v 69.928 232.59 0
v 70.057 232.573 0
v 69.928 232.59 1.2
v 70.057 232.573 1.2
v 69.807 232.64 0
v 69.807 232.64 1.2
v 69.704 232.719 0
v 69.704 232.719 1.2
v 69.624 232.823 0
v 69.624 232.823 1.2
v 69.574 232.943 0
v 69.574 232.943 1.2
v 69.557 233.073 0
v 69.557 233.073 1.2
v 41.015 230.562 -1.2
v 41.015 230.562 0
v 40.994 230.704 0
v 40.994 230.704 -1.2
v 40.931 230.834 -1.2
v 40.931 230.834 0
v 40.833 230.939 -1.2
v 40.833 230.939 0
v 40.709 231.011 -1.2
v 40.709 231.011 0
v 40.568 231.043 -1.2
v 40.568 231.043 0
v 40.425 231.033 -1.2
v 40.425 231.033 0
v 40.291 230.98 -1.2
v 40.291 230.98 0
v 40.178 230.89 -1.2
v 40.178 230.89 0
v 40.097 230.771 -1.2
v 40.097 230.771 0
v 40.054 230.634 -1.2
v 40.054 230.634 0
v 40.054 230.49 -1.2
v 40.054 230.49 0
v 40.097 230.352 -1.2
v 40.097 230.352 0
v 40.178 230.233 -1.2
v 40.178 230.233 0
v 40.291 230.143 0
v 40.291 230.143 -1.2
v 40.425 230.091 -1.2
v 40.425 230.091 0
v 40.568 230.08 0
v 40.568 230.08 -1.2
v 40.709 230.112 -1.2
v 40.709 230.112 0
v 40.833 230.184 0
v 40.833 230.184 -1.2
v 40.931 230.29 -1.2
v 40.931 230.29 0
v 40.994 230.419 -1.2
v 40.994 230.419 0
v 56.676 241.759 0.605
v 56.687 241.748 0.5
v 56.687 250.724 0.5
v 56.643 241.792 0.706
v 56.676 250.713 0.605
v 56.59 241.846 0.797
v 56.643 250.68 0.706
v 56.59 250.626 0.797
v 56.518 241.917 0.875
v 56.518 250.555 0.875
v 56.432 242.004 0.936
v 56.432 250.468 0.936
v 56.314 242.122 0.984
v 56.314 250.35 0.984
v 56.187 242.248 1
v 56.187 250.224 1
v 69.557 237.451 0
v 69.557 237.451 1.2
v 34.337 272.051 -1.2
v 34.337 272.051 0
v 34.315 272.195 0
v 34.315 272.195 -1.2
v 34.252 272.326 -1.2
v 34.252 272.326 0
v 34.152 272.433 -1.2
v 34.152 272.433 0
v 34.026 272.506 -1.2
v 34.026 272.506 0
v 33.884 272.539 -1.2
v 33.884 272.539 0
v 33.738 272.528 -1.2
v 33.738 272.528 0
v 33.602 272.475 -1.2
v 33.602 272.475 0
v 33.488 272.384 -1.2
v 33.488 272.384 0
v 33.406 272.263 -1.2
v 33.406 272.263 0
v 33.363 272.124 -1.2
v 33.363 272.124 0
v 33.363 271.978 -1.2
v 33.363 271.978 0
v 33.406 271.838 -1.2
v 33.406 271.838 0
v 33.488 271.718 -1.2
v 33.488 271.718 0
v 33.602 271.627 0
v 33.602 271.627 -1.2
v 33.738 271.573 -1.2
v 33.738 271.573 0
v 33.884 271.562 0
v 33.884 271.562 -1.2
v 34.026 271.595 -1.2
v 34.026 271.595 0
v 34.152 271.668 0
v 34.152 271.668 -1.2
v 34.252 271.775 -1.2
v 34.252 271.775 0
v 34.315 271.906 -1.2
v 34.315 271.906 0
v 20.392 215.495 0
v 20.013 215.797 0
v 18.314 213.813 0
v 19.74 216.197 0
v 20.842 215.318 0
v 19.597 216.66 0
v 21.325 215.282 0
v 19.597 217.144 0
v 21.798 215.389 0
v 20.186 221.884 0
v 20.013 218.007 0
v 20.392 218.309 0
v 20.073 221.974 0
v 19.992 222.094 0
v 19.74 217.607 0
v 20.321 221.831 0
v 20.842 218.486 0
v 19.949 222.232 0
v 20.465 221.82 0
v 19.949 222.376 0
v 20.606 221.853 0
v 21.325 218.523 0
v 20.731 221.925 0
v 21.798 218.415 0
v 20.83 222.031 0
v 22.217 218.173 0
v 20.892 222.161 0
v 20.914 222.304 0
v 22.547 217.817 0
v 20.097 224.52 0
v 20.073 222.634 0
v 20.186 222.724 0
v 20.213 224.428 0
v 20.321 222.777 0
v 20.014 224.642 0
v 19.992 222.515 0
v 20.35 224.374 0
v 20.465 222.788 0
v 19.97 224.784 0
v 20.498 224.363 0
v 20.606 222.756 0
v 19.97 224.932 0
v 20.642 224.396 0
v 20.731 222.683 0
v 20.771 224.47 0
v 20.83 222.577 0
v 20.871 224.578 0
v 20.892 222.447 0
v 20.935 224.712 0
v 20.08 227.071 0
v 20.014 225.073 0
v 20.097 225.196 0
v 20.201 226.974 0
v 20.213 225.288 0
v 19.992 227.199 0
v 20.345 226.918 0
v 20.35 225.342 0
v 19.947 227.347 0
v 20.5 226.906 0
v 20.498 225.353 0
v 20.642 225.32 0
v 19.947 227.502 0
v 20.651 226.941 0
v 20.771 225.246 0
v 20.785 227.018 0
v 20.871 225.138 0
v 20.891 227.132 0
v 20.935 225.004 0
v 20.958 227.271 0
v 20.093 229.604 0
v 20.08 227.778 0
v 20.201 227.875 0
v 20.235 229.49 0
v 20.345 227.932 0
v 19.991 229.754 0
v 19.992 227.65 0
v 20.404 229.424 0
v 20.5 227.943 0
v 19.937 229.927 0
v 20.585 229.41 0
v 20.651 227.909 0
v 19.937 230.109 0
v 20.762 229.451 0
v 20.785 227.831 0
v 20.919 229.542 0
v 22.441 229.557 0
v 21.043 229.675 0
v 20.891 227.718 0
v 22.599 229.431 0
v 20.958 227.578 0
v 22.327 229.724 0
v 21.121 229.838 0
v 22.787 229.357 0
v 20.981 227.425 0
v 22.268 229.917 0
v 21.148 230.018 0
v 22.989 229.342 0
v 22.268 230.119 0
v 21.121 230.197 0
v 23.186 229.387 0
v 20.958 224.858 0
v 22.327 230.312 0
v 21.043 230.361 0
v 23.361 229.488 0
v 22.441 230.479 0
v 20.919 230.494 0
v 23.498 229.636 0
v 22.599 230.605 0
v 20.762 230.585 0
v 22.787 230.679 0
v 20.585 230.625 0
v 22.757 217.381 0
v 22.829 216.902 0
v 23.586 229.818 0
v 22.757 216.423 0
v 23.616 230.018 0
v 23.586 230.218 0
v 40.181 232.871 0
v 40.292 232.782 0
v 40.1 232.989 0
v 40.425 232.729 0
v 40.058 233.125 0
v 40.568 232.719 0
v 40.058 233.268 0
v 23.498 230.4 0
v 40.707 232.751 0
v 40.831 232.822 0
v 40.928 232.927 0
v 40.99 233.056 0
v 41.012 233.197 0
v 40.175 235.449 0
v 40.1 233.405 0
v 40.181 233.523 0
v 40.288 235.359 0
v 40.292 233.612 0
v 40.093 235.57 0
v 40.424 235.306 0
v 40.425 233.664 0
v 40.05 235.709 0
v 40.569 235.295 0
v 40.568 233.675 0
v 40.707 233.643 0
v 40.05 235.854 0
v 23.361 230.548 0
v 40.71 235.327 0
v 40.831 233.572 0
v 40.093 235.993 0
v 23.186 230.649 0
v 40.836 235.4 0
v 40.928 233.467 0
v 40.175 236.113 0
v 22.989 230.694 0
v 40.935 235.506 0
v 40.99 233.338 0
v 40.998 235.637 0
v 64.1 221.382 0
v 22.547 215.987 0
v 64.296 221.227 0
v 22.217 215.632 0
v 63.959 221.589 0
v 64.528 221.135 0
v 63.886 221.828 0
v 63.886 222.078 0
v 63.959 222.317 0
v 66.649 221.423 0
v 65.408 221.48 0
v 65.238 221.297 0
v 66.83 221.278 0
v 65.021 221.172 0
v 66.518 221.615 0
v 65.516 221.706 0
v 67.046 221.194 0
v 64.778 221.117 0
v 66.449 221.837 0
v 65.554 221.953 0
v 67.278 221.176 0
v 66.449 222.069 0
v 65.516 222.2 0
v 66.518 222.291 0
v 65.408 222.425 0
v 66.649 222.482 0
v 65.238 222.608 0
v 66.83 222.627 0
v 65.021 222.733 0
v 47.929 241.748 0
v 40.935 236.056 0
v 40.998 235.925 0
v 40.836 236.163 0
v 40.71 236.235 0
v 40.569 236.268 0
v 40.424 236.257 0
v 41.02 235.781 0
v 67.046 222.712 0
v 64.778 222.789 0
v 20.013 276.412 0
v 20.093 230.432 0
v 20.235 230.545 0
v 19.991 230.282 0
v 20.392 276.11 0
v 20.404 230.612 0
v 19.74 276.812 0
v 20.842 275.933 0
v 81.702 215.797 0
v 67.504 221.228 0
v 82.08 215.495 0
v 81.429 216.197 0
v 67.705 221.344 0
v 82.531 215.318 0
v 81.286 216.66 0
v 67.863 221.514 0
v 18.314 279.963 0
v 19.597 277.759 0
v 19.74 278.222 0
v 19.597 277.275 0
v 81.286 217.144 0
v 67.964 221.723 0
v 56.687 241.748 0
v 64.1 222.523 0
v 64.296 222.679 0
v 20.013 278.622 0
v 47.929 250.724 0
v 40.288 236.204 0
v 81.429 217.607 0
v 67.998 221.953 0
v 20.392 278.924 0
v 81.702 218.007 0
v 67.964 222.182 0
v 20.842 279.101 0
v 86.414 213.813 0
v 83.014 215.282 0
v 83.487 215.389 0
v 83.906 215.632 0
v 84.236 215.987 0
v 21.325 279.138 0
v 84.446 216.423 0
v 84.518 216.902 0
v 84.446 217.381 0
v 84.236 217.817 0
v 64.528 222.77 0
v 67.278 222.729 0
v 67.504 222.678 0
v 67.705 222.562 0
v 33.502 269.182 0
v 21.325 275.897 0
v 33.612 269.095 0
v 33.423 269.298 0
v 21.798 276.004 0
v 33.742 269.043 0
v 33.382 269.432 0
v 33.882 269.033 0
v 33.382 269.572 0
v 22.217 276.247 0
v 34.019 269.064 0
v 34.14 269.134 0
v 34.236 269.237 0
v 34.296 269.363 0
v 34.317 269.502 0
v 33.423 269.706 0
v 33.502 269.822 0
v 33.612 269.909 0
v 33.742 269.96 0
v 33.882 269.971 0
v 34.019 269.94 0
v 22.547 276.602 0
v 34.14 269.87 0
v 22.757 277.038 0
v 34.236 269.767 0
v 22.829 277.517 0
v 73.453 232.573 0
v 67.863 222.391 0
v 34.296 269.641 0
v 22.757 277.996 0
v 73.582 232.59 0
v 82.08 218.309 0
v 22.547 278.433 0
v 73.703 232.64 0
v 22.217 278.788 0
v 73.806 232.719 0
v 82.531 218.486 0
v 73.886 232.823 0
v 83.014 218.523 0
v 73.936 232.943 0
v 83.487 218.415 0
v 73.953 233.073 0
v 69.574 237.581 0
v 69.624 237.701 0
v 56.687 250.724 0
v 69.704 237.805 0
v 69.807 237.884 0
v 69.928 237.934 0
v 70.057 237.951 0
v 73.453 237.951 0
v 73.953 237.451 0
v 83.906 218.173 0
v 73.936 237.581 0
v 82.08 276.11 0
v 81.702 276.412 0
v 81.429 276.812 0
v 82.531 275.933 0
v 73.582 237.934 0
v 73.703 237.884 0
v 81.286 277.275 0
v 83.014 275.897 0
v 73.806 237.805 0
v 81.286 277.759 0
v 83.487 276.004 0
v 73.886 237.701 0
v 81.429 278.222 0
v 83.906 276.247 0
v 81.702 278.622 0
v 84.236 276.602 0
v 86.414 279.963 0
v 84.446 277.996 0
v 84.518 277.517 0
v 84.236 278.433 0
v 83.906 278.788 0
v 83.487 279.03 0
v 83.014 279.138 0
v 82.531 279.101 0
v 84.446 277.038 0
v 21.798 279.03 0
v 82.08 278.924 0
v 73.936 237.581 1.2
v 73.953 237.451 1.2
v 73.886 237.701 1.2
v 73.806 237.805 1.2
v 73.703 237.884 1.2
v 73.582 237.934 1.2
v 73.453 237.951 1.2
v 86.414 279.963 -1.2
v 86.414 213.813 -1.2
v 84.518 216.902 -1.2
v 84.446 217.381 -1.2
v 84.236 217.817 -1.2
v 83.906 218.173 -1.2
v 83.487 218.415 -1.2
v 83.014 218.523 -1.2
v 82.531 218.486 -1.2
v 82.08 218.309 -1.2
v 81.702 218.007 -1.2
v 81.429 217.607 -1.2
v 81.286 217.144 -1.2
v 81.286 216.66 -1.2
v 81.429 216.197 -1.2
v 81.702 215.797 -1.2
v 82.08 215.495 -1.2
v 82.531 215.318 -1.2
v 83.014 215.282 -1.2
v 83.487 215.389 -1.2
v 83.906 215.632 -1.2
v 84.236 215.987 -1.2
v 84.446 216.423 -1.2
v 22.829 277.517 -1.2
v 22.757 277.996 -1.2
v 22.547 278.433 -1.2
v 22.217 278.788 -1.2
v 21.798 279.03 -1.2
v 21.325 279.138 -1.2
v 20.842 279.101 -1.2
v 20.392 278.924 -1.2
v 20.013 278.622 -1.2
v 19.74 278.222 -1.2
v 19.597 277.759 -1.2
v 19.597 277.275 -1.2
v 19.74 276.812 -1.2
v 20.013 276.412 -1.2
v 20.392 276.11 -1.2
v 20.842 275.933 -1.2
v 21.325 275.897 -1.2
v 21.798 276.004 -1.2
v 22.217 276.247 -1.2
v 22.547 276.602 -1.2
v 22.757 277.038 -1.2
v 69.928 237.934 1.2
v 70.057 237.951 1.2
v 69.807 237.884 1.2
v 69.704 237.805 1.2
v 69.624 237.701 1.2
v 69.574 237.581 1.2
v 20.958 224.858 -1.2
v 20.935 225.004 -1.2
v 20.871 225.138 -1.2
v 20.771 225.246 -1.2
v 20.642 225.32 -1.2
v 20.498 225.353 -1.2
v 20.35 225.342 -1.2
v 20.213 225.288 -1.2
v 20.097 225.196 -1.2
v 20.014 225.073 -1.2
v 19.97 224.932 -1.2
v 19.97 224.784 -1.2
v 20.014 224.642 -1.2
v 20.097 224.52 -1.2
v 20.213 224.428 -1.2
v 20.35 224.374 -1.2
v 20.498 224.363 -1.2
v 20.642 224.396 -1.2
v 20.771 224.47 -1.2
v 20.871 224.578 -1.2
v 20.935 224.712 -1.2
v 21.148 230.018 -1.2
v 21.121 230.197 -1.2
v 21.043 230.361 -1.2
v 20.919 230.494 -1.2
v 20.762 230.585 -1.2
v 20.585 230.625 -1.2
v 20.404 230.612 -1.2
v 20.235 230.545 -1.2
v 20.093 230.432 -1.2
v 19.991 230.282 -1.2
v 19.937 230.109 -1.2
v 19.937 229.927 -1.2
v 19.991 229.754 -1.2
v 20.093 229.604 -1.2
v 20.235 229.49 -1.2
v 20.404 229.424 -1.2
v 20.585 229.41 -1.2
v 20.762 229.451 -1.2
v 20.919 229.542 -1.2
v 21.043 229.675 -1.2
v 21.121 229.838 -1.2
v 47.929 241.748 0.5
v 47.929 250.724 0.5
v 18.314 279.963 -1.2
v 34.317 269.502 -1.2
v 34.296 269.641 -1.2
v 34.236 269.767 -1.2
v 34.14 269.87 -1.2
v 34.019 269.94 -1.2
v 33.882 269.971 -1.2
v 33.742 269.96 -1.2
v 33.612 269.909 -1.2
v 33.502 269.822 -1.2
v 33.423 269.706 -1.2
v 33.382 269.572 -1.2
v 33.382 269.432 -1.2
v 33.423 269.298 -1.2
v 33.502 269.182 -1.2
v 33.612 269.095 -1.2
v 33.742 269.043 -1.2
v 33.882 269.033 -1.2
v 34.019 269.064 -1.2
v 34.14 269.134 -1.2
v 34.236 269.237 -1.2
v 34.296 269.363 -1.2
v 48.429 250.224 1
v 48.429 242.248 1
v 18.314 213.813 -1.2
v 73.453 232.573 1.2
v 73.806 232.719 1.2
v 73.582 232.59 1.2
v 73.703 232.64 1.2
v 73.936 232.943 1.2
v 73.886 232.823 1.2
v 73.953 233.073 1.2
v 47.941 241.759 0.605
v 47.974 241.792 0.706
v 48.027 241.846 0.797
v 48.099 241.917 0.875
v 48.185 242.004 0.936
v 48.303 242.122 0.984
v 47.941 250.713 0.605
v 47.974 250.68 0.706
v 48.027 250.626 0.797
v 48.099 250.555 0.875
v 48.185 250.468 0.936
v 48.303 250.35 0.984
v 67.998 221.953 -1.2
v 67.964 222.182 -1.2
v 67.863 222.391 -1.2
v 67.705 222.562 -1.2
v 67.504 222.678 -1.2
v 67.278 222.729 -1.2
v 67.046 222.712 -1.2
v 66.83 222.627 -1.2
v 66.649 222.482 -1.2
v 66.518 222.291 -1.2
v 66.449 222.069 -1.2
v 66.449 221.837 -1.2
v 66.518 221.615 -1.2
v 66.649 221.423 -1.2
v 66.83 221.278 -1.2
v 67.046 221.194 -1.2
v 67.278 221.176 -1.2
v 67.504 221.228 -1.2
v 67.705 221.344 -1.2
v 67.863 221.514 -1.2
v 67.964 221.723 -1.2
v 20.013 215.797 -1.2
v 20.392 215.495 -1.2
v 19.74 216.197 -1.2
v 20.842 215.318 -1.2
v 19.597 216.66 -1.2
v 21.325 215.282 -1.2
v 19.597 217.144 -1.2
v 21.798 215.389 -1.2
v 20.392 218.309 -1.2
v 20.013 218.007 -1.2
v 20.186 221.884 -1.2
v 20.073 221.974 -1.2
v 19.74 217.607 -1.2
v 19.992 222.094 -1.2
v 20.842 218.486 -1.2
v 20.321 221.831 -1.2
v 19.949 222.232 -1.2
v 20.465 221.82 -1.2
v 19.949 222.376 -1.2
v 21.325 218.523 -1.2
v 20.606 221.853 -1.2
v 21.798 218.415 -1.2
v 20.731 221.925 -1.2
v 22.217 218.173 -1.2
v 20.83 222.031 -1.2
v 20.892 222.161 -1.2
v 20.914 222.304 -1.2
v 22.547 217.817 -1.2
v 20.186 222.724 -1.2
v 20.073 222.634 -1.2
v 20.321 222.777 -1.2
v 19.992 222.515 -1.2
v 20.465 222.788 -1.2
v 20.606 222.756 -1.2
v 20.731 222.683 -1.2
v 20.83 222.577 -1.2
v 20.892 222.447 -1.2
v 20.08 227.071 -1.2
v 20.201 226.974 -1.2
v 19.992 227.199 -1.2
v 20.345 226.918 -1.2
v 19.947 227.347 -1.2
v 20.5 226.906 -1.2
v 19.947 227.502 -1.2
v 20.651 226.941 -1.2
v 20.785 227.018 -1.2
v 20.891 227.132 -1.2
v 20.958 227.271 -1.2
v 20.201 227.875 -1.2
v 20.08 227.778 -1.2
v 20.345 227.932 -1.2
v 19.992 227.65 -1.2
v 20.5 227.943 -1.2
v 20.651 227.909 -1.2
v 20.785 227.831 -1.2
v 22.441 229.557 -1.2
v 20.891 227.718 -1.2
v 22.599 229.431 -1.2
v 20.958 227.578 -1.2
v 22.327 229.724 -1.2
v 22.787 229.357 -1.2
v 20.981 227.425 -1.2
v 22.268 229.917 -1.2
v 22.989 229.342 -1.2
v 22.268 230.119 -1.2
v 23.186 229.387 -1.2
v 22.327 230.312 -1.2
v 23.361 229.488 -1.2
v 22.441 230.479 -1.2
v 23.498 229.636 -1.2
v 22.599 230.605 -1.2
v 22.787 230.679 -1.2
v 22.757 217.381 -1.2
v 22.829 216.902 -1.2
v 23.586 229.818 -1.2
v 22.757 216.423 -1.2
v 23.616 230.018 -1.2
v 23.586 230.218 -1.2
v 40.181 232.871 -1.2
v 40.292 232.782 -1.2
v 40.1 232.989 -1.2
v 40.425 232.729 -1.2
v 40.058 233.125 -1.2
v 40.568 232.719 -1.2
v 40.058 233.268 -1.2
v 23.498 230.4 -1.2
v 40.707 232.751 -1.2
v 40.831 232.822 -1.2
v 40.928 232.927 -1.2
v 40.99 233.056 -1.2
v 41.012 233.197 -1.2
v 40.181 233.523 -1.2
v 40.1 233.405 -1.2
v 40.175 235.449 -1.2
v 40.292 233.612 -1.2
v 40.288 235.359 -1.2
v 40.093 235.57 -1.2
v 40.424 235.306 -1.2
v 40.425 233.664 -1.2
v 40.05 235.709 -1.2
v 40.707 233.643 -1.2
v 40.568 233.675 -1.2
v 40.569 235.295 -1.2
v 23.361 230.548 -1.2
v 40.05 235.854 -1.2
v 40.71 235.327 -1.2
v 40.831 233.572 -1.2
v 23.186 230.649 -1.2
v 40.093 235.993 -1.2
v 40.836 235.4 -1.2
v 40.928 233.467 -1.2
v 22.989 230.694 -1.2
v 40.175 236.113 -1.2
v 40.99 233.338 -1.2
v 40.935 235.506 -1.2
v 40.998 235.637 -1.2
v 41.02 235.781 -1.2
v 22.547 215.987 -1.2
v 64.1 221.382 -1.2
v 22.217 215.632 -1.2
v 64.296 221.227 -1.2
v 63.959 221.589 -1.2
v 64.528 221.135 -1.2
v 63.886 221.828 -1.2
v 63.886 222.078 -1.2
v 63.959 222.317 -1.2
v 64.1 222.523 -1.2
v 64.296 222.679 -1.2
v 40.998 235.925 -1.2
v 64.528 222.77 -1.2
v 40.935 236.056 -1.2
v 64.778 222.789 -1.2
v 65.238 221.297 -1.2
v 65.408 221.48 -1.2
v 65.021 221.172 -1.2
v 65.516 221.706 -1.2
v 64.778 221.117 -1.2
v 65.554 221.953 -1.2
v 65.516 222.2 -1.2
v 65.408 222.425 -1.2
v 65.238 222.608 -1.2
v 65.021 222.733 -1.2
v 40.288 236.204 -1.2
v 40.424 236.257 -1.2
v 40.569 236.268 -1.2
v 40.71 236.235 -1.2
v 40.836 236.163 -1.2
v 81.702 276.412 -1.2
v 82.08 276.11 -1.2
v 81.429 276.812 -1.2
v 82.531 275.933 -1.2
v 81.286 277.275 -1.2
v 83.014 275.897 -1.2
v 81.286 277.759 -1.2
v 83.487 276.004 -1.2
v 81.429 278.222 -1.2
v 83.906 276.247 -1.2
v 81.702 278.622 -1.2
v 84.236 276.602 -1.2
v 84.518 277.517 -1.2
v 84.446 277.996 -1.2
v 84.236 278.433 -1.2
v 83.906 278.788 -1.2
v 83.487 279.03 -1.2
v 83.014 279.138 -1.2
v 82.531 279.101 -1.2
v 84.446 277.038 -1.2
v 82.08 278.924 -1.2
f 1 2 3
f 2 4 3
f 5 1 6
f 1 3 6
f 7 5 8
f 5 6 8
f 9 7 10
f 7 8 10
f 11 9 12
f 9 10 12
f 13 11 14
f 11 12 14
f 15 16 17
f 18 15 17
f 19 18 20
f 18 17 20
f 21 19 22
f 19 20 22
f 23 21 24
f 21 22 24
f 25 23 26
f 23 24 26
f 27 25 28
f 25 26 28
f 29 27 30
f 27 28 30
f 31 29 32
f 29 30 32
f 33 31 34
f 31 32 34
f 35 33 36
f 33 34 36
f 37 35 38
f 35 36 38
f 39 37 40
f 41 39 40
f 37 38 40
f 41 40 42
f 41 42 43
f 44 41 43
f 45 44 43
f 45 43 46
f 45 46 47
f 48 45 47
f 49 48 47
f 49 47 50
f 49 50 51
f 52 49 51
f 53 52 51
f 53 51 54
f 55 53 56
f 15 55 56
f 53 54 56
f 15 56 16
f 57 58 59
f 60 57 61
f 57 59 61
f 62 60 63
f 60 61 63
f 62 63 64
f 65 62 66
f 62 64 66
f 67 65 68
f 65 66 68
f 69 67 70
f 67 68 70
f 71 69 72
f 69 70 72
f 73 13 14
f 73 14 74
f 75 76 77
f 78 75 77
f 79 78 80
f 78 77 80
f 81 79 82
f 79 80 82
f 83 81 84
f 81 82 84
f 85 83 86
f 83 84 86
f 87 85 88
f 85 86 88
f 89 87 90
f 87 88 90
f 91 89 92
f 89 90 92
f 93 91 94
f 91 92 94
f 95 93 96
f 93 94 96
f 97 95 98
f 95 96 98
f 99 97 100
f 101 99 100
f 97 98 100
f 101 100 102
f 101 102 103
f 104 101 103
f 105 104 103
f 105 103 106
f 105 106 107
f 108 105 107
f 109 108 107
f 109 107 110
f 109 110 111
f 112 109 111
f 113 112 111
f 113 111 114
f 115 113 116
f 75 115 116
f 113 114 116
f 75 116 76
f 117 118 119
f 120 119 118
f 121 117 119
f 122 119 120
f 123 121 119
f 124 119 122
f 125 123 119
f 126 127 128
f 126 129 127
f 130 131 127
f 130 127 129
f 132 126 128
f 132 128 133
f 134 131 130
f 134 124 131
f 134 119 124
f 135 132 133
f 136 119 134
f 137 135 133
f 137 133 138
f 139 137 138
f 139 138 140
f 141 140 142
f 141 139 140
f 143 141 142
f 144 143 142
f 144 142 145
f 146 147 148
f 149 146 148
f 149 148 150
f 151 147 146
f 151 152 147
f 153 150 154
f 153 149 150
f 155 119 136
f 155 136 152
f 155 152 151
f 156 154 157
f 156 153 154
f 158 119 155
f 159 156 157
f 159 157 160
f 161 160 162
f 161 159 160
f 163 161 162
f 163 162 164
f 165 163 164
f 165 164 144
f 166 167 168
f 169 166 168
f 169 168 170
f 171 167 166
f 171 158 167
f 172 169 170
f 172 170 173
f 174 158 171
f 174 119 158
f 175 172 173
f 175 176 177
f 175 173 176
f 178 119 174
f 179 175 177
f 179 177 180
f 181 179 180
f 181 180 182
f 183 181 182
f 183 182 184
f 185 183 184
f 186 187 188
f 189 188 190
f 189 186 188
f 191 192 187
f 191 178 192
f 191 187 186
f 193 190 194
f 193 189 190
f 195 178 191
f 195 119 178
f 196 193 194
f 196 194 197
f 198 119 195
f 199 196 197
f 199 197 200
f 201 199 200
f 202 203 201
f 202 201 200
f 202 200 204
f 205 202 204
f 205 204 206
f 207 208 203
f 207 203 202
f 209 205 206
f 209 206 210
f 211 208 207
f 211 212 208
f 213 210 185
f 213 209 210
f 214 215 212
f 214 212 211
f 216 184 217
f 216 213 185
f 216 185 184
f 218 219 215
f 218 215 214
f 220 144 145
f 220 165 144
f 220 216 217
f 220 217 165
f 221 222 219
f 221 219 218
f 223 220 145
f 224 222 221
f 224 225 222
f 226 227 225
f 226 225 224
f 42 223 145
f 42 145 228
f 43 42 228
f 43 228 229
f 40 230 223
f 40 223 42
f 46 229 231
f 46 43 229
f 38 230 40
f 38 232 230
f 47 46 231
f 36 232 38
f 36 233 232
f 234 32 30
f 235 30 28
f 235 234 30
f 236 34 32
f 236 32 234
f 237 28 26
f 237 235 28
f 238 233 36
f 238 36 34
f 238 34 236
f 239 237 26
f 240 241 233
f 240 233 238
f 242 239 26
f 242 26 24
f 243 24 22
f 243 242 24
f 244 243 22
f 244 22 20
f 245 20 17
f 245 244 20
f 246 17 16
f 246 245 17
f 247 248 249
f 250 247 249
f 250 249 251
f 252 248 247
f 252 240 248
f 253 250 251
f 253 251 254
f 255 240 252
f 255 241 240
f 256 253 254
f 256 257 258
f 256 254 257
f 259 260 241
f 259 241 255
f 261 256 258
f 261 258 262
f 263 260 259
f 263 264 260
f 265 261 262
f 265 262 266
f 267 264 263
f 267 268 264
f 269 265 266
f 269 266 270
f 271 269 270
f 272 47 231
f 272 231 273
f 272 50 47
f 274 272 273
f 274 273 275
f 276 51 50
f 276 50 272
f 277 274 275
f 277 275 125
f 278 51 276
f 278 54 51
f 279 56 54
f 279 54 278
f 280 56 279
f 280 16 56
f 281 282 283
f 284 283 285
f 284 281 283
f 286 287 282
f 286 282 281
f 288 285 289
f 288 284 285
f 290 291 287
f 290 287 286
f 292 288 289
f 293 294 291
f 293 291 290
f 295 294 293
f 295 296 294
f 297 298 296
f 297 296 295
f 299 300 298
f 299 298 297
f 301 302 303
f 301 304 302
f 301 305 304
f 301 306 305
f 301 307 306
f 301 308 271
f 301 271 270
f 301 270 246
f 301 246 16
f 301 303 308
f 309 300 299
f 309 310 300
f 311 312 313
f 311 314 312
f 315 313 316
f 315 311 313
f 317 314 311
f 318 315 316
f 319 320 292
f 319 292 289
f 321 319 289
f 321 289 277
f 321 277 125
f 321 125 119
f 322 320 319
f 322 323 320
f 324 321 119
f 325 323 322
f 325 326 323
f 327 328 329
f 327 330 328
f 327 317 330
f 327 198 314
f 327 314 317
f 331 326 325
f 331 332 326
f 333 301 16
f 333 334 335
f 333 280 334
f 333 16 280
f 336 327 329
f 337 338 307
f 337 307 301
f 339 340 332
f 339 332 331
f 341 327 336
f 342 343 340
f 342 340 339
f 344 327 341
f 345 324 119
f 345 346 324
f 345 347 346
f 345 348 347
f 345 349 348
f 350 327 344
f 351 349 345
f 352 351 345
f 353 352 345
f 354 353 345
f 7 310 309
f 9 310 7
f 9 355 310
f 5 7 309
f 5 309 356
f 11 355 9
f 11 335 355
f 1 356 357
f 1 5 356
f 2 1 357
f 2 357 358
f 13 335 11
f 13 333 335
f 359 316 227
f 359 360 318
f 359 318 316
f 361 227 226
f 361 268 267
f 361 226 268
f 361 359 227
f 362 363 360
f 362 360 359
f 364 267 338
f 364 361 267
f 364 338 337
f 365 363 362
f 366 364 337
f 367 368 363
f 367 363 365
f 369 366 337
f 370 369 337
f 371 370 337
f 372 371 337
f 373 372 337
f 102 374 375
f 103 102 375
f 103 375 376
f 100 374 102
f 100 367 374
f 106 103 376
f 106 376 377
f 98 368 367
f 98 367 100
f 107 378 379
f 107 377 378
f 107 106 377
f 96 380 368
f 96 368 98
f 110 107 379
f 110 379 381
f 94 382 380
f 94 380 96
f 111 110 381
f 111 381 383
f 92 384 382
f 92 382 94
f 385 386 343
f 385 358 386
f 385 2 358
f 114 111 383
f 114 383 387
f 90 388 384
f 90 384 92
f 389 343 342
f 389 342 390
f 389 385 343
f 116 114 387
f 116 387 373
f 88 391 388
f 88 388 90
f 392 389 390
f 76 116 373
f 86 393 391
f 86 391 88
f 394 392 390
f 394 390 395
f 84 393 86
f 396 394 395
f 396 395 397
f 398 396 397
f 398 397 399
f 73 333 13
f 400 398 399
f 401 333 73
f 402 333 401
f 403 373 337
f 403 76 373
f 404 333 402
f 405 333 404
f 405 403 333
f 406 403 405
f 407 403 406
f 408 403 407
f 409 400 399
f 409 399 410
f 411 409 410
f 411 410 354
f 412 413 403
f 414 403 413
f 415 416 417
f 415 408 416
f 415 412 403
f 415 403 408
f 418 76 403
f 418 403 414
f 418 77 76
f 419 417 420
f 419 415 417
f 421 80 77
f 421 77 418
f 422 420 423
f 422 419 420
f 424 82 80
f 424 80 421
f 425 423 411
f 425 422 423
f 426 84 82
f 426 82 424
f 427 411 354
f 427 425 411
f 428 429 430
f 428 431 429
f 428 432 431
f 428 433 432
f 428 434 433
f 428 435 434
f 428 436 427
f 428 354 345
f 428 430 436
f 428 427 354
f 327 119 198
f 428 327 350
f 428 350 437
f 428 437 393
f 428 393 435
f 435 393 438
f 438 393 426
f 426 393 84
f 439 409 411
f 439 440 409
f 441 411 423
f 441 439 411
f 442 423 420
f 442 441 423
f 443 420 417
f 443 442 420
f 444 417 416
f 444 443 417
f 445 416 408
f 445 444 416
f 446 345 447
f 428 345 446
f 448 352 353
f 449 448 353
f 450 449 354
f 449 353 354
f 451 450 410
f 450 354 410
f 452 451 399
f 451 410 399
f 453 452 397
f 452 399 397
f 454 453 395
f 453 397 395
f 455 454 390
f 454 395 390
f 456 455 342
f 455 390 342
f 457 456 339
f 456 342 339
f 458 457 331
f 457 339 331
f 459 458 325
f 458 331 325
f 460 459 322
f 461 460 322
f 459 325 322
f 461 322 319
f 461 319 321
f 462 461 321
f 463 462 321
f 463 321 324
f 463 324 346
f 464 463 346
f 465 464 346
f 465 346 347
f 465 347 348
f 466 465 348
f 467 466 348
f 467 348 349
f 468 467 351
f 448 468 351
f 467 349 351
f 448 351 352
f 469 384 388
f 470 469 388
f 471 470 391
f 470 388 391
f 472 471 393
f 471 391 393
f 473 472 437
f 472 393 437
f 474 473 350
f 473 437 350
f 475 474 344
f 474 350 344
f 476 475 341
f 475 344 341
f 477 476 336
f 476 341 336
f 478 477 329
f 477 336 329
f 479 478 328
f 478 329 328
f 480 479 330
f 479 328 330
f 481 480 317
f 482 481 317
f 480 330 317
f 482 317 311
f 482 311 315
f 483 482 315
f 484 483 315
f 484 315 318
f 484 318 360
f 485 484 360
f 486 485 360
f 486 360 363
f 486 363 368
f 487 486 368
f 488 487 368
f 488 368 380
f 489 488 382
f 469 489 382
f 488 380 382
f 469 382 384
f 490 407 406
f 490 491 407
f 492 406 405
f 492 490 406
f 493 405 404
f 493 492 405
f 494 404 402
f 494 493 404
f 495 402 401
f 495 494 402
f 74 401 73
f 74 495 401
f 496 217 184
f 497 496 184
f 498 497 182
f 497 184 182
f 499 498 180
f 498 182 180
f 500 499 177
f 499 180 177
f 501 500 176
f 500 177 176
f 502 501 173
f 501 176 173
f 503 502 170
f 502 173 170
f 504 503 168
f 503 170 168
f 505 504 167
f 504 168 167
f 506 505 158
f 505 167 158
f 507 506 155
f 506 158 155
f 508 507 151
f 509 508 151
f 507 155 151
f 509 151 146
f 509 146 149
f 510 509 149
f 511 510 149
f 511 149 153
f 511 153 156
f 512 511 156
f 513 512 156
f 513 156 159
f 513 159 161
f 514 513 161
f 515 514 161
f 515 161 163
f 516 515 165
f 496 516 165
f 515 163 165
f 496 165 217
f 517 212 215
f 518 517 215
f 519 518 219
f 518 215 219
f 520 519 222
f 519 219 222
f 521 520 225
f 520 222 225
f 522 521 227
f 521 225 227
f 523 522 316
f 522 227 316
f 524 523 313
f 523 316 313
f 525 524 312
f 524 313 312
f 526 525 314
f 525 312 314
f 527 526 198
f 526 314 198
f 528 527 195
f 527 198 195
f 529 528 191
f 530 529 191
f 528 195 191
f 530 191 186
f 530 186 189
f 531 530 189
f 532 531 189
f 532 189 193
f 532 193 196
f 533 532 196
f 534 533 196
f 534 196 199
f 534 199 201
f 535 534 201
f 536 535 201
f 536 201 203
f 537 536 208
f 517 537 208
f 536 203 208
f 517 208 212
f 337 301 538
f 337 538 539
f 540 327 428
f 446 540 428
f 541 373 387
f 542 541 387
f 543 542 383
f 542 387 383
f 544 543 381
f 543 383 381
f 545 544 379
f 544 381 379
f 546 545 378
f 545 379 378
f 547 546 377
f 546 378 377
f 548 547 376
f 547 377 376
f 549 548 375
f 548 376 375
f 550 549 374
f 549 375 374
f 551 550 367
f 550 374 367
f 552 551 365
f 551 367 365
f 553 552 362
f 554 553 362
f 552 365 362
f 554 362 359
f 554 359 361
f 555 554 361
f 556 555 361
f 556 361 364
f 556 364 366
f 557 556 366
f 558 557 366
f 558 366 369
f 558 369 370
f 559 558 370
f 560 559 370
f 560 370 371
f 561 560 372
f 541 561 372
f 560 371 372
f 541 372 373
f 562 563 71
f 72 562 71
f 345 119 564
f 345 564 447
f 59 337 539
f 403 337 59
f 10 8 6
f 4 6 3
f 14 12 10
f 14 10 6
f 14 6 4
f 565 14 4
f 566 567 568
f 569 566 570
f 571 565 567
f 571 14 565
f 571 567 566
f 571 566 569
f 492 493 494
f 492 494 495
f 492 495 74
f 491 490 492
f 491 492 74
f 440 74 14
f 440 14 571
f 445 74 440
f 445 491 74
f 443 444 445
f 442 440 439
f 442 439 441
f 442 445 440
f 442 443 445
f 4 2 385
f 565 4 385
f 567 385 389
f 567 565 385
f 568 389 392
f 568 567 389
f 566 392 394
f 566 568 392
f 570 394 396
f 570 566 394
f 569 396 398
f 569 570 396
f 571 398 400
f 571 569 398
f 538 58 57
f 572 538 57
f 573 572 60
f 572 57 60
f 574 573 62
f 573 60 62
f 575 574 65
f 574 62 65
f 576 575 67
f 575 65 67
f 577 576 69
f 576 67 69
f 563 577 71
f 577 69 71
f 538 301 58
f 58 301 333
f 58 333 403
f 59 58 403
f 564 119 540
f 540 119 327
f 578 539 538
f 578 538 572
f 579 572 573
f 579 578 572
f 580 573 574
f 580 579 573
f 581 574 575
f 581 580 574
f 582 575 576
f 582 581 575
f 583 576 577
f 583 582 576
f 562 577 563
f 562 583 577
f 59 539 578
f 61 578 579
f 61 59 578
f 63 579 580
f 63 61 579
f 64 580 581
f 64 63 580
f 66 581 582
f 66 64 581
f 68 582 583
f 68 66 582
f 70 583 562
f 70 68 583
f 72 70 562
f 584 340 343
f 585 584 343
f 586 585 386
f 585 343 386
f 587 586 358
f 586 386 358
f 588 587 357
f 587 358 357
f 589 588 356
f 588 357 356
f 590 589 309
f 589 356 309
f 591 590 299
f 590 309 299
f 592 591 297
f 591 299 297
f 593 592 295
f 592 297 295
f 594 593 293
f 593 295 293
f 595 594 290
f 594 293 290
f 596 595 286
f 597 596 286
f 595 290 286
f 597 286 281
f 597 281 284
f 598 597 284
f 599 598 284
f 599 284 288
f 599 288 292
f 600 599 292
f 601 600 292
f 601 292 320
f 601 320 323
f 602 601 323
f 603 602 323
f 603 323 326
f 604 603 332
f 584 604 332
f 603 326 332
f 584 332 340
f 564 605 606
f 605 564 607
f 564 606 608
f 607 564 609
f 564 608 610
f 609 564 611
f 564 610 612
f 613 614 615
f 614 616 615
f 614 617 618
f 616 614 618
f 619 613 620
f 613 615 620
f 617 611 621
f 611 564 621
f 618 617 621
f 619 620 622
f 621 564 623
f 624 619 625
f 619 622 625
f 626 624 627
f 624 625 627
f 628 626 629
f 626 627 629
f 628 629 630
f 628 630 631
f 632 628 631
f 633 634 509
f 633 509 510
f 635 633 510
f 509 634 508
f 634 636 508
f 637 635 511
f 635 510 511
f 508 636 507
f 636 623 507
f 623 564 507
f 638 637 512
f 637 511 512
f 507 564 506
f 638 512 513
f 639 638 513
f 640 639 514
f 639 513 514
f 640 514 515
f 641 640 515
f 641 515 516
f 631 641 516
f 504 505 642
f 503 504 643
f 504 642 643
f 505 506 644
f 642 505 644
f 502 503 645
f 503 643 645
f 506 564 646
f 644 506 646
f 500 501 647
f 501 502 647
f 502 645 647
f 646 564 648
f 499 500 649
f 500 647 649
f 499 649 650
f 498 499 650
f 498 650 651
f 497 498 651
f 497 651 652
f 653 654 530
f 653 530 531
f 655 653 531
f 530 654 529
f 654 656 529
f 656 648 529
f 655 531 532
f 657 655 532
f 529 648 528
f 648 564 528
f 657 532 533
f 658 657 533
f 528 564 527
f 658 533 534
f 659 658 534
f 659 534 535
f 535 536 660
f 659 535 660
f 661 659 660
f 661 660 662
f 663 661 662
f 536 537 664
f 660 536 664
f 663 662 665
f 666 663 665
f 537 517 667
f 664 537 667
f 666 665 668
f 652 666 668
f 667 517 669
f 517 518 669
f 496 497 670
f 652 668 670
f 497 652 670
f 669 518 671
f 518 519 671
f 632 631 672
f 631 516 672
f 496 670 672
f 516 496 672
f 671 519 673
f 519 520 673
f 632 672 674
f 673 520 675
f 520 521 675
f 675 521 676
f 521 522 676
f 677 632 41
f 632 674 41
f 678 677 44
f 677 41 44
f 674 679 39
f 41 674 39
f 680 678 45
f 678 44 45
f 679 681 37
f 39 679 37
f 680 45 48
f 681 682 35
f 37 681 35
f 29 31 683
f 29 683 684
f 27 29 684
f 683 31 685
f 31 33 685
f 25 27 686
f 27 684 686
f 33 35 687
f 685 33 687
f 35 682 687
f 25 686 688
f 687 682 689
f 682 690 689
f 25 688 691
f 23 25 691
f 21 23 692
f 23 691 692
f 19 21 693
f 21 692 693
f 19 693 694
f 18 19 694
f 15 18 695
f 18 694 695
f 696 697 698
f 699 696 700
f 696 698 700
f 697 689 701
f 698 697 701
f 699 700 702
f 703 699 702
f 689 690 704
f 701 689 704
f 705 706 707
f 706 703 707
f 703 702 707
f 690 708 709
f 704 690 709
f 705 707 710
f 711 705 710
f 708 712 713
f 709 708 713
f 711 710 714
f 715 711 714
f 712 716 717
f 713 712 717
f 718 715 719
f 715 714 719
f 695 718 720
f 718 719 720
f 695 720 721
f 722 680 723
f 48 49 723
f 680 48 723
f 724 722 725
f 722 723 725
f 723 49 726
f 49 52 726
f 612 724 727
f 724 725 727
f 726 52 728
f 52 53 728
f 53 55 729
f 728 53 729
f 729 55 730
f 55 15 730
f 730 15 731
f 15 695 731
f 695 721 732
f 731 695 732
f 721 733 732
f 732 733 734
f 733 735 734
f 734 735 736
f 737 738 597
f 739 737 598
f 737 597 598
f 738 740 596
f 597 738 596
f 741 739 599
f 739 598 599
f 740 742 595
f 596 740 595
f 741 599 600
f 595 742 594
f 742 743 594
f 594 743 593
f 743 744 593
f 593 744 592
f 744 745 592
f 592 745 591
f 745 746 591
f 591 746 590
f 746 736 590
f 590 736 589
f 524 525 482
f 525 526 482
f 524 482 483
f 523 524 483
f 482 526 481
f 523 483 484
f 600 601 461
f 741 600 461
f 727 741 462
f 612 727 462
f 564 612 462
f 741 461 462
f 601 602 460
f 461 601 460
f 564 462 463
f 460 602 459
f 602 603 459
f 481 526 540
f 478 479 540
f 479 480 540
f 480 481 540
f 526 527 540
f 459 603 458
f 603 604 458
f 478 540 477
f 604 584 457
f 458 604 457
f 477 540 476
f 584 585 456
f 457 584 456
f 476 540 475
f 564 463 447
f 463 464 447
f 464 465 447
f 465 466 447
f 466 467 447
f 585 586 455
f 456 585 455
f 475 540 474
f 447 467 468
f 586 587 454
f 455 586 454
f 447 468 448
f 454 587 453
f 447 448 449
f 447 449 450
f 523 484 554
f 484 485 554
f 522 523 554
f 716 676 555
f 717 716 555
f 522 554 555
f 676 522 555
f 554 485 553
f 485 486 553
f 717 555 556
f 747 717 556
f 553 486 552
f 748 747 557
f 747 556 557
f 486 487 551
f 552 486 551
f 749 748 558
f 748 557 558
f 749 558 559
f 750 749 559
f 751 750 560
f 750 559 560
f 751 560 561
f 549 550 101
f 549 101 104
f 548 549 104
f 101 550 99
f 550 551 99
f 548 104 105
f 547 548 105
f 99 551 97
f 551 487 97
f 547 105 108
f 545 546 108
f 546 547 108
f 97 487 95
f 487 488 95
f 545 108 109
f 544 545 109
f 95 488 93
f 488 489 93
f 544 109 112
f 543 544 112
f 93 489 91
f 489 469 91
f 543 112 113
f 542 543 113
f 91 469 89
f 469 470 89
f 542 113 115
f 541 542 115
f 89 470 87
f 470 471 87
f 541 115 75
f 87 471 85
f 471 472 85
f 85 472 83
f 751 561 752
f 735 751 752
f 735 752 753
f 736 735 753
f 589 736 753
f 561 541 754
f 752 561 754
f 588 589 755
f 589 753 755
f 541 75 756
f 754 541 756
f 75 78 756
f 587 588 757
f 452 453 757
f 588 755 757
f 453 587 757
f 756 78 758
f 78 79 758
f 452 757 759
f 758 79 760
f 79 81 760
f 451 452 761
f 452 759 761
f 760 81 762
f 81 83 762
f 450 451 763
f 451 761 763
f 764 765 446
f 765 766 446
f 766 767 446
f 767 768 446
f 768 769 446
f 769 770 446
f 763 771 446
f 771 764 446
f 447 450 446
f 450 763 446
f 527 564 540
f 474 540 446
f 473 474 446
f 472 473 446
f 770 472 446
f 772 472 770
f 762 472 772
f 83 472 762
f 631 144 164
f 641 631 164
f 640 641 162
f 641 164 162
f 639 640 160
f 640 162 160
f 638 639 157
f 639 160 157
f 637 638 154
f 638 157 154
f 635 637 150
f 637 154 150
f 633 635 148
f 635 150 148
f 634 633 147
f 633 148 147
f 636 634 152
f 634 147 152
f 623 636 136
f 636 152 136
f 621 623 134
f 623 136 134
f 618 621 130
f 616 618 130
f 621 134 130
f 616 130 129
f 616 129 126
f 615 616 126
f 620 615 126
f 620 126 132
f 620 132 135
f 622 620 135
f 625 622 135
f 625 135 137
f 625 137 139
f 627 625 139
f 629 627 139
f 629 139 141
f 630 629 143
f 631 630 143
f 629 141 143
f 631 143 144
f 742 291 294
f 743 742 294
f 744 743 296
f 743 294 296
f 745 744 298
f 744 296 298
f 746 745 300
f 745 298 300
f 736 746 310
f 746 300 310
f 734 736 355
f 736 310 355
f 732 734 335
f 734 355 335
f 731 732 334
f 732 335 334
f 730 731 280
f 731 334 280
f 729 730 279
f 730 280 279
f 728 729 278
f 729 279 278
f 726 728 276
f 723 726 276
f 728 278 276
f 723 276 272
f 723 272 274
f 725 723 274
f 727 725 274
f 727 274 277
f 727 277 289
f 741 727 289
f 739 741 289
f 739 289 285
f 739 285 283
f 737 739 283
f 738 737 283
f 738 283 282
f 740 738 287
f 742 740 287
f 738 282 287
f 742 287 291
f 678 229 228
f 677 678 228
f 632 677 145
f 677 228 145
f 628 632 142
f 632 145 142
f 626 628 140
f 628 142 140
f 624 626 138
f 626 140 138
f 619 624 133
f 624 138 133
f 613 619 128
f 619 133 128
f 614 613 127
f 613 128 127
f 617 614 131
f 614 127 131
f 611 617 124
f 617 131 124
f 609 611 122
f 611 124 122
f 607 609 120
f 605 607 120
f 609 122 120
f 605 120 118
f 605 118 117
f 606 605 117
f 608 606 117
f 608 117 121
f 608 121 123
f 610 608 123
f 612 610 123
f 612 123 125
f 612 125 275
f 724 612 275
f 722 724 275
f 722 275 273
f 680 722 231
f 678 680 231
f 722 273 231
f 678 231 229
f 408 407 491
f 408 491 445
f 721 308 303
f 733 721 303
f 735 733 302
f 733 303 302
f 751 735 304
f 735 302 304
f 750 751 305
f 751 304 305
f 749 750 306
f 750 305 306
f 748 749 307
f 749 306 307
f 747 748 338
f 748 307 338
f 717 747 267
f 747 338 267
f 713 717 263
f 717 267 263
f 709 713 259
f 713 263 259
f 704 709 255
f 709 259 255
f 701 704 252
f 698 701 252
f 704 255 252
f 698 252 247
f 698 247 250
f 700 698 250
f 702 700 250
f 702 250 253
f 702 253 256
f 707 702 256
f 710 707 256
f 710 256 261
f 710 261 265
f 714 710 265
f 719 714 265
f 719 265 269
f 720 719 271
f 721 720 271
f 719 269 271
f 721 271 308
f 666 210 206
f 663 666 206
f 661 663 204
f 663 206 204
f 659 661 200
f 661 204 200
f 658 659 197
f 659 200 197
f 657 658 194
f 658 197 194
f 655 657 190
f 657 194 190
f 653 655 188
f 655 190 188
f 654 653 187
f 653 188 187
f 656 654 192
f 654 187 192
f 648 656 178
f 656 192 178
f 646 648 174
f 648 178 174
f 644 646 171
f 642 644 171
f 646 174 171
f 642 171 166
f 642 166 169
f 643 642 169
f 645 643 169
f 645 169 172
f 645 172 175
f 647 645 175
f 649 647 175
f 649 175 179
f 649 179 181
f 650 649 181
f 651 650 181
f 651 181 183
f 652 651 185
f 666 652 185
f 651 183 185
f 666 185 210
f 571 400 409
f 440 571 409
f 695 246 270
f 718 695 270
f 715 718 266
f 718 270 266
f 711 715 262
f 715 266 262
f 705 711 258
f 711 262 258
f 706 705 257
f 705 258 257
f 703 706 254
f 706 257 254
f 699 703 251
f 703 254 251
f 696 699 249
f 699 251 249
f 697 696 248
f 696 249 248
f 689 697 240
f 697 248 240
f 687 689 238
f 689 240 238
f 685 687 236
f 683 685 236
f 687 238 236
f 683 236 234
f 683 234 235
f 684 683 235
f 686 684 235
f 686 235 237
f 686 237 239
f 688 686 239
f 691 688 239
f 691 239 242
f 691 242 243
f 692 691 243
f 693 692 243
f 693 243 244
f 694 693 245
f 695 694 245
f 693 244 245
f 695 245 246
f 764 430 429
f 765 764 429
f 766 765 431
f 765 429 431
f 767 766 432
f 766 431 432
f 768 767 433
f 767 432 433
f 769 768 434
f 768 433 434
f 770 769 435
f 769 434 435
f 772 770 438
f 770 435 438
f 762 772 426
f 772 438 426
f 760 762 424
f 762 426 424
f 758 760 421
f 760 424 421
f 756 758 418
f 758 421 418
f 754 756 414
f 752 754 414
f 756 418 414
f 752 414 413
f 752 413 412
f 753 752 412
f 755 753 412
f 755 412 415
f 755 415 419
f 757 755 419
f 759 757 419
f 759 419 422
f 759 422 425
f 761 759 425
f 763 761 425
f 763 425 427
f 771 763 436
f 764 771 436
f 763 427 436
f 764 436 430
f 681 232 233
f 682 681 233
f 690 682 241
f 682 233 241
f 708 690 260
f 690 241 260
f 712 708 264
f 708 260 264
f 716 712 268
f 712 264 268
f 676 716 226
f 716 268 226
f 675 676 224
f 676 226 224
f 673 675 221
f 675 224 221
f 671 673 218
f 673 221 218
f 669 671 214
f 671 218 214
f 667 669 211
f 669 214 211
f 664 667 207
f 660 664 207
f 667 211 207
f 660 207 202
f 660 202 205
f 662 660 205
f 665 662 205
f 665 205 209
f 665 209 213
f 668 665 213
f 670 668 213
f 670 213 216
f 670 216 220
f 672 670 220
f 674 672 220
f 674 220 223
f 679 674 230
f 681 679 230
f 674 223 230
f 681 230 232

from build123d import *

# Parameters (mm, degrees)
ESQUISSE1_W        = 68.1
ESQUISSE1_H        = 66.15
ESQUISSE1_R        = 1.625
ESQUISSE1_R_2      = 0.5199497
ESQUISSE1_R_3      = 0.496597476
ESQUISSE1_R_4      = 0.485049202
ESQUISSE1_R_5      = 0.608998307
ESQUISSE1_R_6      = 0.677903493
ESQUISSE1_R_7      = 0.838572367
ESQUISSE1_R_8      = 0.778774178
ESQUISSE1_R_9      = 0.487785526
ESQUISSE1_R_10     = 0.479472078
ESQUISSE1_R_11     = 0.483052504
ESQUISSE1_R_12     = 0.489527541
ESQUISSE1_R_13     = 0.470271612
BOSS_EXTRU_1_DEPTH = 1.2
ESQUISSE3_W        = 8.757871462
ESQUISSE3_H        = 8.976039079
BOSS_EXTRU_2_DEPTH = 1
CONG_1_R           = 0.5
ESQUISSE4_W        = 4.395615229
ESQUISSE4_H        = 5.378660169
BOSS_EXTRU_3_DEPTH = 1.2
CONG_2_R           = 0.5


with BuildPart() as part:
    # Esquisse1 → Boss.-Extru.1 (new body)
    with BuildSketch(Plane.XY):
        with Locations((52.364343219, 246.888419198)):
            Rectangle(ESQUISSE1_W, ESQUISSE1_H)
        with Locations((21.20400612, 216.902097721)):
            Circle(ESQUISSE1_R, mode=Mode.SUBTRACT)
        with Locations((82.892966431, 216.902097721)):
            Circle(ESQUISSE1_R, mode=Mode.SUBTRACT)
        with Locations((21.20400612, 277.517138812)):
            Circle(ESQUISSE1_R, mode=Mode.SUBTRACT)
        with Locations((82.892966431, 277.517138812)):
            Circle(ESQUISSE1_R, mode=Mode.SUBTRACT)
        with Locations((20.460946771, 227.424751553)):
            Circle(ESQUISSE1_R_2, mode=Mode.SUBTRACT)
        with Locations((20.460946771, 224.857942008)):
            Circle(ESQUISSE1_R_3, mode=Mode.SUBTRACT)
        with Locations((20.428852881, 222.304104047)):
            Circle(ESQUISSE1_R_4, mode=Mode.SUBTRACT)
        with Locations((20.539364867, 230.017790559)):
            Circle(ESQUISSE1_R_5, mode=Mode.SUBTRACT)
        with Locations((22.937900475, 230.017790559)):
            Circle(ESQUISSE1_R_6, mode=Mode.SUBTRACT)
        with Locations((64.715000433, 221.952763309)):
            Circle(ESQUISSE1_R_7, mode=Mode.SUBTRACT)
        with Locations((67.21953945, 221.952763309)):
            Circle(ESQUISSE1_R_8, mode=Mode.SUBTRACT)
        with Locations((40.53207734, 235.781211634)):
            Circle(ESQUISSE1_R_9, mode=Mode.SUBTRACT)
        with Locations((40.53207734, 233.196854691)):
            Circle(ESQUISSE1_R_10, mode=Mode.SUBTRACT)
        with Locations((40.53207734, 230.561657941)):
            Circle(ESQUISSE1_R_11, mode=Mode.SUBTRACT)
        with Locations((33.847033777, 272.050619819)):
            Circle(ESQUISSE1_R_12, mode=Mode.SUBTRACT)
        with Locations((33.847033777, 269.501928251)):
            Circle(ESQUISSE1_R_13, mode=Mode.SUBTRACT)
    extrude(amount=-BOSS_EXTRU_1_DEPTH)

    # Esquisse3 → Boss.-Extru.2 (add)
    with BuildSketch(Plane.XY):
        with Locations((52.308376614, 246.236021207)):
            Rectangle(ESQUISSE3_W, ESQUISSE3_H)
    extrude(amount=BOSS_EXTRU_2_DEPTH)

    # Congé1
    cong_1_edges = [part.edges().sort_by_distance(p)[0] for p in [
        (47.929440883, 246.236021207, 1),
        (52.308376614, 241.748001667, 1),
        (56.687312345, 246.236021207, 1),
        (52.308376614, 250.724040746, 1),
    ]]
    fillet(cong_1_edges, radius=CONG_1_R)

    # Esquisse4 → Boss.-Extru.3 (add)
    with BuildSketch(Plane.XY):
        with Locations((71.755113955, 235.261974176)):
            Rectangle(ESQUISSE4_W, ESQUISSE4_H)
    extrude(amount=BOSS_EXTRU_3_DEPTH)

    # Congé2
    cong_2_edges = [part.edges().sort_by_distance(p)[0] for p in [
        (69.55730634, 237.95130426, 0.6),
        (69.55730634, 232.572644091, 0.6),
        (73.952921569, 232.572644091, 0.6),
        (73.952921569, 237.95130426, 0.6),
    ]]
    fillet(cong_2_edges, radius=CONG_2_R)


solid = part.part
